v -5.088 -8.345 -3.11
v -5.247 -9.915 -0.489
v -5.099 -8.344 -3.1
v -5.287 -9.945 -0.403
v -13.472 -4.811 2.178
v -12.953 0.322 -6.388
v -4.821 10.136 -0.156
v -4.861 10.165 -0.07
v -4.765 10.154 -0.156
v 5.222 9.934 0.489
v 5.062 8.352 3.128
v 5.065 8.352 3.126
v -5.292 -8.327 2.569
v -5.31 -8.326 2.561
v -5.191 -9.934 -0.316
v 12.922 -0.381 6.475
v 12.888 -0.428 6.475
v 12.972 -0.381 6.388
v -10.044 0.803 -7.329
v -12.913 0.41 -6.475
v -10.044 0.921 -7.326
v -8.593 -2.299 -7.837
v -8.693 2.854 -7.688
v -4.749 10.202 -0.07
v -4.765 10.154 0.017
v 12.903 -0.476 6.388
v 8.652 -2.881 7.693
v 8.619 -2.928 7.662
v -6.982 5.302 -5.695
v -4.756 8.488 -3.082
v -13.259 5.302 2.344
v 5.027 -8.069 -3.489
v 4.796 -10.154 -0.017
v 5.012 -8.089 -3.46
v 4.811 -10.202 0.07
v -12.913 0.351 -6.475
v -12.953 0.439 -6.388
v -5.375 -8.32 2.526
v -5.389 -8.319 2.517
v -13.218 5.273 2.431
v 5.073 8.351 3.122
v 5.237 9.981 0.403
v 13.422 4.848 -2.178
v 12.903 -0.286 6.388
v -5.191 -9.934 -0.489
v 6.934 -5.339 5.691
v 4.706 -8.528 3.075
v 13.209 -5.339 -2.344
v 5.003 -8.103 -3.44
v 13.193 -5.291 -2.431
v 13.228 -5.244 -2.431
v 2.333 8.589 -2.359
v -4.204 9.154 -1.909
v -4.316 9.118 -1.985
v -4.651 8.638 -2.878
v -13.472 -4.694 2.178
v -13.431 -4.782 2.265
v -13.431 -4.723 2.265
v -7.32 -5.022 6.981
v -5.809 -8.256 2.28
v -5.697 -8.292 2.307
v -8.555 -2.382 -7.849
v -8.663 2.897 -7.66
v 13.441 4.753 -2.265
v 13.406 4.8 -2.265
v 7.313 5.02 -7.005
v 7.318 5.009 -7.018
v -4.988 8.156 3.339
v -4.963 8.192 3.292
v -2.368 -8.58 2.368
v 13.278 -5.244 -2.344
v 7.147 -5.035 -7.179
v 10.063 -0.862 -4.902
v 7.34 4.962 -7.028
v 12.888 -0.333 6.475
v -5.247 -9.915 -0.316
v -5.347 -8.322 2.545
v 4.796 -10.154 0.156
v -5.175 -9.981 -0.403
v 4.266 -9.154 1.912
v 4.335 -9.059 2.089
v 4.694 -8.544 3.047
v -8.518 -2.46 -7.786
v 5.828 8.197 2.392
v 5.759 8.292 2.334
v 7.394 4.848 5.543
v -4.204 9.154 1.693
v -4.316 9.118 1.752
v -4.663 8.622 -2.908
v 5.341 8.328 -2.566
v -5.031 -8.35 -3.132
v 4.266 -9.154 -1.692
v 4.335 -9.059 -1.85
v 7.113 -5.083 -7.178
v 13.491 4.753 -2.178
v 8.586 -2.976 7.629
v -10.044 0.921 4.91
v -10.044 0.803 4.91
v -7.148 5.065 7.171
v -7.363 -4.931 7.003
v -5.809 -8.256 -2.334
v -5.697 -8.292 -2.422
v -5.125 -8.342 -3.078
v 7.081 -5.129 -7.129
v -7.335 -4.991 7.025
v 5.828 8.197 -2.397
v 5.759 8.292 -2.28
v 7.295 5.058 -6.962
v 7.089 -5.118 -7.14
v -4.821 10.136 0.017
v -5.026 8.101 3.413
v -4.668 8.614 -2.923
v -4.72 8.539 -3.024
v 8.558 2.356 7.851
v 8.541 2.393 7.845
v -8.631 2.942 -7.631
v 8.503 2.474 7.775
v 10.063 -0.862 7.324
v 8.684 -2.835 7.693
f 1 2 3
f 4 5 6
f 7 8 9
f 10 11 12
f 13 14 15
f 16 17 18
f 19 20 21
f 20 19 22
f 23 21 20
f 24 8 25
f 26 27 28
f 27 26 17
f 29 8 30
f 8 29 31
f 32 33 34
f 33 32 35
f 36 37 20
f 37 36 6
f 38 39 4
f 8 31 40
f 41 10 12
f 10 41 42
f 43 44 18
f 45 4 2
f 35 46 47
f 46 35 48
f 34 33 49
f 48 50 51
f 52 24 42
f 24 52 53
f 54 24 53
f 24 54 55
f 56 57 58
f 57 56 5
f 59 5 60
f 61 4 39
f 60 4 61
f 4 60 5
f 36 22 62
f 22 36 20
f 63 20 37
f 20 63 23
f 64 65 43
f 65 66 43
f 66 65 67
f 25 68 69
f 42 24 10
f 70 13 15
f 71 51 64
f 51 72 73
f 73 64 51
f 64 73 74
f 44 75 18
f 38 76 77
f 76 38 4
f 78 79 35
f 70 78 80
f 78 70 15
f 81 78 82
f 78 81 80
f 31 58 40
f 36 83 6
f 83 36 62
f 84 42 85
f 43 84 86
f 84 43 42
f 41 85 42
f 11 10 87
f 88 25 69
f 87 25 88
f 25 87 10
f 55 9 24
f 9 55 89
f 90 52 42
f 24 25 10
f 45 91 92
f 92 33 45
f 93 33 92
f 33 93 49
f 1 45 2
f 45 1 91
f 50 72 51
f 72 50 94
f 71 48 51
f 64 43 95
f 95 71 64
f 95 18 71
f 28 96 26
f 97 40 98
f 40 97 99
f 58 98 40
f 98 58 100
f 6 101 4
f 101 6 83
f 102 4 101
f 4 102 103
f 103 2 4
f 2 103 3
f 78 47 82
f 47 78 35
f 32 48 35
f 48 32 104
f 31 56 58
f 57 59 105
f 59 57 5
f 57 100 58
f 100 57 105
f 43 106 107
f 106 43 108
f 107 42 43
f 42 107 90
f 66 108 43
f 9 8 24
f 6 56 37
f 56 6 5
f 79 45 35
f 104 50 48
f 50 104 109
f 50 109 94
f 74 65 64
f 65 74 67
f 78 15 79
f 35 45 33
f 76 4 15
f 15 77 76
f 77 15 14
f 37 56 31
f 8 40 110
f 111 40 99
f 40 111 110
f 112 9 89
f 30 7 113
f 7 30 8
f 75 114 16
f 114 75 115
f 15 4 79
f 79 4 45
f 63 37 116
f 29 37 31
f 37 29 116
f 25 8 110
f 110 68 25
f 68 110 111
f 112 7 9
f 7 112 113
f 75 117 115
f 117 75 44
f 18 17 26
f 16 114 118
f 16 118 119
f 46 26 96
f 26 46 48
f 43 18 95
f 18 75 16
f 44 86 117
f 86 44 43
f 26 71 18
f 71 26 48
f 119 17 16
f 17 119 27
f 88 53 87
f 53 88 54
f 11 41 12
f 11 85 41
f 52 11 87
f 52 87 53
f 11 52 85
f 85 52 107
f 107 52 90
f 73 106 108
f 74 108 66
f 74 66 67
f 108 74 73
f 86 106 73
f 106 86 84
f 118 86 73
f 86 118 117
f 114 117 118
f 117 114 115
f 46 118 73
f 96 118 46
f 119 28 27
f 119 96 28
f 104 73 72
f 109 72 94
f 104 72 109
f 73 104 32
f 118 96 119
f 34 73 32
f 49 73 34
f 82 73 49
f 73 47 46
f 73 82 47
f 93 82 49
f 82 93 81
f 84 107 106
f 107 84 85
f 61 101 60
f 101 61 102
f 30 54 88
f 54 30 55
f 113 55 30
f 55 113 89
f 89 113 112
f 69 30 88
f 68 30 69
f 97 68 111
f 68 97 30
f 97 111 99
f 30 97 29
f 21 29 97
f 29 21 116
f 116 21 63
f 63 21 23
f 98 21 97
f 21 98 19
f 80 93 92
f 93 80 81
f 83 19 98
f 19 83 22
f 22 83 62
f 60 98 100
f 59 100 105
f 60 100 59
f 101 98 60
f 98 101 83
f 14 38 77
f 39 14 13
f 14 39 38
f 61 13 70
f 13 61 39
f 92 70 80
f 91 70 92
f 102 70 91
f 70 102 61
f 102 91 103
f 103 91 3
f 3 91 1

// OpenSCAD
// Auto-generated OpenSCAD file

    inner_points = 10*[[-0.5727942453287636, -0.8196991841635889, -0.49999999999979927], [0.572794245328764, 0.8196991841635887, 0.49999999999979927], [0.4234831942827272, -0.9059039596778707, 0.5000000000000533], [-0.42348319428272685, 0.9059039596778705, -0.5000000000000533], [0.9962774396112515, -0.08620477551448197, -0.5000000000001475], [-0.996277439611251, 0.08620477551448175, 0.5000000000001475], [0.9962774396114111, -0.08620477551434857, 0.49999999999985245], [-0.9962774396114107, 0.08620477551434835, -0.49999999999985245], [0.5727942453286043, 0.8196991841634554, -0.5000000000002008], [-0.5727942453286039, -0.8196991841634557, 0.5000000000002008], [0.42348319428256764, -0.905903959678004, -0.4999999999999469], [-0.4234831942825673, 0.9059039596780037, 0.4999999999999469], [0.5230238949797952, 0.24449813621619343, -1.3164965809278422], [-0.5230238949797947, -0.24449813621619365, 1.3164965809278422], [-0.049770350348888805, -0.5752010479473287, -1.3164965809276414], [0.04977035034888918, 0.5752010479473285, 1.3164965809276414], [-0.47325354463153607, 0.33070291173060856, -1.3164965809276947], [0.4732535446315364, -0.3307029117306088, 1.3164965809276947]];

    outer_points = 10*[[0.5298790273108971, -0.49733729572507634, -0.8496374701582584], [-0.5298790273108971, 0.49733729572507634, 0.8496374701582584], [-0.5206247255916664, -0.9885998081008317, -0.040253130631053124], [0.5206247255916664, 0.9885998081008317, 0.040253130631053124], [0.44745605235875646, -0.5243669819275101, 0.8802399385802442], [-0.44745605235875646, 0.5243669819275101, -0.8802399385802442], [-0.5511838178154568, -0.5022973355596736, 0.833002872544885], [0.5511838178154568, 0.5022973355596736, -0.833002872544885], [0.46876084286331626, 0.47526764935724, 0.8968745361936177], [-0.46876084286331626, -0.47526764935724, -0.8968745361936177], [0.4780151445825469, -1.010669454468668, 0.006983935404306196], [-0.4780151445825469, 1.010669454468668, -0.006983935404306196], [1.287231649678413, -0.038064509386351864, 0.6388132388414419], [-1.287231649678413, 0.038064509386351864, -0.6388132388414419], [1.3177907419022037, -0.5243669819275101, -0.23444276433449618], [-1.3177907419022037, 0.5243669819275101, 0.23444276433449618], [1.3390955324067635, 0.47526764935724, -0.2178081667211227], [-1.3390955324067635, -0.47526764935724, 0.2178081667211227]];

    // Convex hull for inner set (I)
    module inner_hull() {
        hull() {
            for (p = inner_points) {
                translate(p) sphere(r=0.1);
            }
        }
    }

    // Convex hull for outer set (O) minus inner hull (O \ I)
    module outer_minus_inner() {
        difference() {
            hull() {
                for (p = outer_points) {
                    translate(p) sphere(r=0.1);
                }
            }
            inner_hull(); // Subtract inner hull
        }
    }

    // Convex hull for outer set (O) minus all translated inner hulls
    module outer_minus_AllTranslationInner() {
        difference() {
            hull() {
                for (p = outer_points) {
                    translate(p) sphere(r=0.1);
                }
            }
            hull() {
                translate([0,0,50]) inner_hull();
                translate([0,0,-50]) inner_hull();
            }; // Subtract translated inner hulls
        }
    }

    // Difference between outer_minus_inner and outer_minus_AllTranslationInner
    module outer_minus_inner_diff() {
        difference() {
            // Outer minus inner
            difference() {
                hull() {
                    for (p = outer_points) {
                        translate(p) sphere(r=0.1);
                    }
                }
                inner_hull();
            }

            // Subtract Outer minus AllTranslationInner
            difference() {
                hull() {
                    for (p = outer_points) {
                        translate(p) sphere(r=0.1);
                    }
                }
                hull() {
                    translate([0,0,50]) inner_hull();
                    translate([0,0,-50]) inner_hull();
                };
            }
        }
    }

    // Rendering all with colors applied
    color([0, 1, 0, 1]) outer_minus_AllTranslationInner(); // Opaque green
    
